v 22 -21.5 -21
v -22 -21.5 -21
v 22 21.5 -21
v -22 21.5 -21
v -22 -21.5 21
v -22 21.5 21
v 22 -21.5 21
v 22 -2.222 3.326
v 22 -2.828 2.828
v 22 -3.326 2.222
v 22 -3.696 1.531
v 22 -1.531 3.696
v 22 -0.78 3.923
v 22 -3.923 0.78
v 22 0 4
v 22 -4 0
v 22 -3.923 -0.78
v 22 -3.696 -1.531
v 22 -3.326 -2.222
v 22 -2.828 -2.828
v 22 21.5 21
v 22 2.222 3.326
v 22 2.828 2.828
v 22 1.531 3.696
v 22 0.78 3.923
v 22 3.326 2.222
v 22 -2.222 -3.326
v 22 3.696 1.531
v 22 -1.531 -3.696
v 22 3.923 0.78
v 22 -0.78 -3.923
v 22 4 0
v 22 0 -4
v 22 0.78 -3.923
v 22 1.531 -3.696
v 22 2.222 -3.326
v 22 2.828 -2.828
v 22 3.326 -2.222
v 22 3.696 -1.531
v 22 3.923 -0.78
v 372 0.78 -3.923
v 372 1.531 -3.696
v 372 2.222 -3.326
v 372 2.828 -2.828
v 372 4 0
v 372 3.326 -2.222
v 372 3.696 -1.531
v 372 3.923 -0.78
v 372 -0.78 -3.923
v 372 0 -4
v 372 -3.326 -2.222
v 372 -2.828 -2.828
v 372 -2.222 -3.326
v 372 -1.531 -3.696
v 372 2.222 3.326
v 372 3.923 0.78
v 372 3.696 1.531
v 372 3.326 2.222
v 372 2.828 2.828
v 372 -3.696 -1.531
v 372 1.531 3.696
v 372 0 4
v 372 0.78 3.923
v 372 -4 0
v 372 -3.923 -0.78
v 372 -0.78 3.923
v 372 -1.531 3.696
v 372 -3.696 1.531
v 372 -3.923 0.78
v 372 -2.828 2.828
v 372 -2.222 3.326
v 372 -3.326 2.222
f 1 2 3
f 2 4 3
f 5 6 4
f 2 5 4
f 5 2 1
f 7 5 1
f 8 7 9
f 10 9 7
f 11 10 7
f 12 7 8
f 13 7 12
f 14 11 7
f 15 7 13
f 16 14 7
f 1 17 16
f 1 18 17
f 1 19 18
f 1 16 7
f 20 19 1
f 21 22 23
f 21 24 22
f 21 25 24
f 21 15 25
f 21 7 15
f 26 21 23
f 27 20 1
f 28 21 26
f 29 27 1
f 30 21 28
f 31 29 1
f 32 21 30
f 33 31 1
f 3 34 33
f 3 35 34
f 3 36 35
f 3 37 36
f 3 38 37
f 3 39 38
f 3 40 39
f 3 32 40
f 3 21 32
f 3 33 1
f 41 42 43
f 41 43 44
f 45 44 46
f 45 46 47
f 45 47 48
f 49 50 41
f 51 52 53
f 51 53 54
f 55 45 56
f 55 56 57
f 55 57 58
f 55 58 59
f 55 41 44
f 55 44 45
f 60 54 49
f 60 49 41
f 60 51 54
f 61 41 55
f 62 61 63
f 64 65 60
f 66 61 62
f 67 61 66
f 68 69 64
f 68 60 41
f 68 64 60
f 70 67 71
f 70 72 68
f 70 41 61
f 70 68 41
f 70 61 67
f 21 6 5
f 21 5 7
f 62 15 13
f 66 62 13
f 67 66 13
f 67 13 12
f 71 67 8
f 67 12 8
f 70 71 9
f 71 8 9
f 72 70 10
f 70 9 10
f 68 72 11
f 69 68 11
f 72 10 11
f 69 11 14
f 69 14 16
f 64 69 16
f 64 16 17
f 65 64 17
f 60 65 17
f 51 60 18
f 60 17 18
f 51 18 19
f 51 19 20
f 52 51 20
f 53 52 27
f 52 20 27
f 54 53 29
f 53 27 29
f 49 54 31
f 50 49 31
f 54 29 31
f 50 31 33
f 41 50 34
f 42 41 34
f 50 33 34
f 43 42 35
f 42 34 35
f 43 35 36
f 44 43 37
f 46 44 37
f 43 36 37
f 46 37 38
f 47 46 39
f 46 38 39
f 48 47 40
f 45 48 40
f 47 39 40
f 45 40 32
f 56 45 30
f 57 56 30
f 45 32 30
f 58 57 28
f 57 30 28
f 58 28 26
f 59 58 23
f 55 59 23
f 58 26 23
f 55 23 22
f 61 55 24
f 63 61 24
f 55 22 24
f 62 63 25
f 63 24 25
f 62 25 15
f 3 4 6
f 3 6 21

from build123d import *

# Parameters (mm, degrees)
CROQUIS1_W              = 44
CROQUIS1_H              = 42
SALIENTE_EXTRUIR1_DEPTH = 21.5
CROQUIS2_R              = 4
SALIENTE_EXTRUIR2_DEPTH = 350


with BuildPart() as part:
    # Croquis1 → Saliente-Extruir1 (new, symmetric)
    with BuildSketch(Plane(origin=(0, 0, 0), x_dir=(1, 0, 0), z_dir=(0, 1, 0))):
        Rectangle(CROQUIS1_W, CROQUIS1_H)
    extrude(amount=SALIENTE_EXTRUIR1_DEPTH, both=True)

    # Croquis2 → Saliente-Extruir2 (add)
    with BuildSketch(Plane(origin=(22, 0, 0), x_dir=(0, 0, -1), z_dir=(1, 0, 0))):
        with Locations(Location((0, 0, 0), (0, 0, 180))):
            Circle(CROQUIS2_R)
    extrude(amount=SALIENTE_EXTRUIR2_DEPTH)


solid = part.part
